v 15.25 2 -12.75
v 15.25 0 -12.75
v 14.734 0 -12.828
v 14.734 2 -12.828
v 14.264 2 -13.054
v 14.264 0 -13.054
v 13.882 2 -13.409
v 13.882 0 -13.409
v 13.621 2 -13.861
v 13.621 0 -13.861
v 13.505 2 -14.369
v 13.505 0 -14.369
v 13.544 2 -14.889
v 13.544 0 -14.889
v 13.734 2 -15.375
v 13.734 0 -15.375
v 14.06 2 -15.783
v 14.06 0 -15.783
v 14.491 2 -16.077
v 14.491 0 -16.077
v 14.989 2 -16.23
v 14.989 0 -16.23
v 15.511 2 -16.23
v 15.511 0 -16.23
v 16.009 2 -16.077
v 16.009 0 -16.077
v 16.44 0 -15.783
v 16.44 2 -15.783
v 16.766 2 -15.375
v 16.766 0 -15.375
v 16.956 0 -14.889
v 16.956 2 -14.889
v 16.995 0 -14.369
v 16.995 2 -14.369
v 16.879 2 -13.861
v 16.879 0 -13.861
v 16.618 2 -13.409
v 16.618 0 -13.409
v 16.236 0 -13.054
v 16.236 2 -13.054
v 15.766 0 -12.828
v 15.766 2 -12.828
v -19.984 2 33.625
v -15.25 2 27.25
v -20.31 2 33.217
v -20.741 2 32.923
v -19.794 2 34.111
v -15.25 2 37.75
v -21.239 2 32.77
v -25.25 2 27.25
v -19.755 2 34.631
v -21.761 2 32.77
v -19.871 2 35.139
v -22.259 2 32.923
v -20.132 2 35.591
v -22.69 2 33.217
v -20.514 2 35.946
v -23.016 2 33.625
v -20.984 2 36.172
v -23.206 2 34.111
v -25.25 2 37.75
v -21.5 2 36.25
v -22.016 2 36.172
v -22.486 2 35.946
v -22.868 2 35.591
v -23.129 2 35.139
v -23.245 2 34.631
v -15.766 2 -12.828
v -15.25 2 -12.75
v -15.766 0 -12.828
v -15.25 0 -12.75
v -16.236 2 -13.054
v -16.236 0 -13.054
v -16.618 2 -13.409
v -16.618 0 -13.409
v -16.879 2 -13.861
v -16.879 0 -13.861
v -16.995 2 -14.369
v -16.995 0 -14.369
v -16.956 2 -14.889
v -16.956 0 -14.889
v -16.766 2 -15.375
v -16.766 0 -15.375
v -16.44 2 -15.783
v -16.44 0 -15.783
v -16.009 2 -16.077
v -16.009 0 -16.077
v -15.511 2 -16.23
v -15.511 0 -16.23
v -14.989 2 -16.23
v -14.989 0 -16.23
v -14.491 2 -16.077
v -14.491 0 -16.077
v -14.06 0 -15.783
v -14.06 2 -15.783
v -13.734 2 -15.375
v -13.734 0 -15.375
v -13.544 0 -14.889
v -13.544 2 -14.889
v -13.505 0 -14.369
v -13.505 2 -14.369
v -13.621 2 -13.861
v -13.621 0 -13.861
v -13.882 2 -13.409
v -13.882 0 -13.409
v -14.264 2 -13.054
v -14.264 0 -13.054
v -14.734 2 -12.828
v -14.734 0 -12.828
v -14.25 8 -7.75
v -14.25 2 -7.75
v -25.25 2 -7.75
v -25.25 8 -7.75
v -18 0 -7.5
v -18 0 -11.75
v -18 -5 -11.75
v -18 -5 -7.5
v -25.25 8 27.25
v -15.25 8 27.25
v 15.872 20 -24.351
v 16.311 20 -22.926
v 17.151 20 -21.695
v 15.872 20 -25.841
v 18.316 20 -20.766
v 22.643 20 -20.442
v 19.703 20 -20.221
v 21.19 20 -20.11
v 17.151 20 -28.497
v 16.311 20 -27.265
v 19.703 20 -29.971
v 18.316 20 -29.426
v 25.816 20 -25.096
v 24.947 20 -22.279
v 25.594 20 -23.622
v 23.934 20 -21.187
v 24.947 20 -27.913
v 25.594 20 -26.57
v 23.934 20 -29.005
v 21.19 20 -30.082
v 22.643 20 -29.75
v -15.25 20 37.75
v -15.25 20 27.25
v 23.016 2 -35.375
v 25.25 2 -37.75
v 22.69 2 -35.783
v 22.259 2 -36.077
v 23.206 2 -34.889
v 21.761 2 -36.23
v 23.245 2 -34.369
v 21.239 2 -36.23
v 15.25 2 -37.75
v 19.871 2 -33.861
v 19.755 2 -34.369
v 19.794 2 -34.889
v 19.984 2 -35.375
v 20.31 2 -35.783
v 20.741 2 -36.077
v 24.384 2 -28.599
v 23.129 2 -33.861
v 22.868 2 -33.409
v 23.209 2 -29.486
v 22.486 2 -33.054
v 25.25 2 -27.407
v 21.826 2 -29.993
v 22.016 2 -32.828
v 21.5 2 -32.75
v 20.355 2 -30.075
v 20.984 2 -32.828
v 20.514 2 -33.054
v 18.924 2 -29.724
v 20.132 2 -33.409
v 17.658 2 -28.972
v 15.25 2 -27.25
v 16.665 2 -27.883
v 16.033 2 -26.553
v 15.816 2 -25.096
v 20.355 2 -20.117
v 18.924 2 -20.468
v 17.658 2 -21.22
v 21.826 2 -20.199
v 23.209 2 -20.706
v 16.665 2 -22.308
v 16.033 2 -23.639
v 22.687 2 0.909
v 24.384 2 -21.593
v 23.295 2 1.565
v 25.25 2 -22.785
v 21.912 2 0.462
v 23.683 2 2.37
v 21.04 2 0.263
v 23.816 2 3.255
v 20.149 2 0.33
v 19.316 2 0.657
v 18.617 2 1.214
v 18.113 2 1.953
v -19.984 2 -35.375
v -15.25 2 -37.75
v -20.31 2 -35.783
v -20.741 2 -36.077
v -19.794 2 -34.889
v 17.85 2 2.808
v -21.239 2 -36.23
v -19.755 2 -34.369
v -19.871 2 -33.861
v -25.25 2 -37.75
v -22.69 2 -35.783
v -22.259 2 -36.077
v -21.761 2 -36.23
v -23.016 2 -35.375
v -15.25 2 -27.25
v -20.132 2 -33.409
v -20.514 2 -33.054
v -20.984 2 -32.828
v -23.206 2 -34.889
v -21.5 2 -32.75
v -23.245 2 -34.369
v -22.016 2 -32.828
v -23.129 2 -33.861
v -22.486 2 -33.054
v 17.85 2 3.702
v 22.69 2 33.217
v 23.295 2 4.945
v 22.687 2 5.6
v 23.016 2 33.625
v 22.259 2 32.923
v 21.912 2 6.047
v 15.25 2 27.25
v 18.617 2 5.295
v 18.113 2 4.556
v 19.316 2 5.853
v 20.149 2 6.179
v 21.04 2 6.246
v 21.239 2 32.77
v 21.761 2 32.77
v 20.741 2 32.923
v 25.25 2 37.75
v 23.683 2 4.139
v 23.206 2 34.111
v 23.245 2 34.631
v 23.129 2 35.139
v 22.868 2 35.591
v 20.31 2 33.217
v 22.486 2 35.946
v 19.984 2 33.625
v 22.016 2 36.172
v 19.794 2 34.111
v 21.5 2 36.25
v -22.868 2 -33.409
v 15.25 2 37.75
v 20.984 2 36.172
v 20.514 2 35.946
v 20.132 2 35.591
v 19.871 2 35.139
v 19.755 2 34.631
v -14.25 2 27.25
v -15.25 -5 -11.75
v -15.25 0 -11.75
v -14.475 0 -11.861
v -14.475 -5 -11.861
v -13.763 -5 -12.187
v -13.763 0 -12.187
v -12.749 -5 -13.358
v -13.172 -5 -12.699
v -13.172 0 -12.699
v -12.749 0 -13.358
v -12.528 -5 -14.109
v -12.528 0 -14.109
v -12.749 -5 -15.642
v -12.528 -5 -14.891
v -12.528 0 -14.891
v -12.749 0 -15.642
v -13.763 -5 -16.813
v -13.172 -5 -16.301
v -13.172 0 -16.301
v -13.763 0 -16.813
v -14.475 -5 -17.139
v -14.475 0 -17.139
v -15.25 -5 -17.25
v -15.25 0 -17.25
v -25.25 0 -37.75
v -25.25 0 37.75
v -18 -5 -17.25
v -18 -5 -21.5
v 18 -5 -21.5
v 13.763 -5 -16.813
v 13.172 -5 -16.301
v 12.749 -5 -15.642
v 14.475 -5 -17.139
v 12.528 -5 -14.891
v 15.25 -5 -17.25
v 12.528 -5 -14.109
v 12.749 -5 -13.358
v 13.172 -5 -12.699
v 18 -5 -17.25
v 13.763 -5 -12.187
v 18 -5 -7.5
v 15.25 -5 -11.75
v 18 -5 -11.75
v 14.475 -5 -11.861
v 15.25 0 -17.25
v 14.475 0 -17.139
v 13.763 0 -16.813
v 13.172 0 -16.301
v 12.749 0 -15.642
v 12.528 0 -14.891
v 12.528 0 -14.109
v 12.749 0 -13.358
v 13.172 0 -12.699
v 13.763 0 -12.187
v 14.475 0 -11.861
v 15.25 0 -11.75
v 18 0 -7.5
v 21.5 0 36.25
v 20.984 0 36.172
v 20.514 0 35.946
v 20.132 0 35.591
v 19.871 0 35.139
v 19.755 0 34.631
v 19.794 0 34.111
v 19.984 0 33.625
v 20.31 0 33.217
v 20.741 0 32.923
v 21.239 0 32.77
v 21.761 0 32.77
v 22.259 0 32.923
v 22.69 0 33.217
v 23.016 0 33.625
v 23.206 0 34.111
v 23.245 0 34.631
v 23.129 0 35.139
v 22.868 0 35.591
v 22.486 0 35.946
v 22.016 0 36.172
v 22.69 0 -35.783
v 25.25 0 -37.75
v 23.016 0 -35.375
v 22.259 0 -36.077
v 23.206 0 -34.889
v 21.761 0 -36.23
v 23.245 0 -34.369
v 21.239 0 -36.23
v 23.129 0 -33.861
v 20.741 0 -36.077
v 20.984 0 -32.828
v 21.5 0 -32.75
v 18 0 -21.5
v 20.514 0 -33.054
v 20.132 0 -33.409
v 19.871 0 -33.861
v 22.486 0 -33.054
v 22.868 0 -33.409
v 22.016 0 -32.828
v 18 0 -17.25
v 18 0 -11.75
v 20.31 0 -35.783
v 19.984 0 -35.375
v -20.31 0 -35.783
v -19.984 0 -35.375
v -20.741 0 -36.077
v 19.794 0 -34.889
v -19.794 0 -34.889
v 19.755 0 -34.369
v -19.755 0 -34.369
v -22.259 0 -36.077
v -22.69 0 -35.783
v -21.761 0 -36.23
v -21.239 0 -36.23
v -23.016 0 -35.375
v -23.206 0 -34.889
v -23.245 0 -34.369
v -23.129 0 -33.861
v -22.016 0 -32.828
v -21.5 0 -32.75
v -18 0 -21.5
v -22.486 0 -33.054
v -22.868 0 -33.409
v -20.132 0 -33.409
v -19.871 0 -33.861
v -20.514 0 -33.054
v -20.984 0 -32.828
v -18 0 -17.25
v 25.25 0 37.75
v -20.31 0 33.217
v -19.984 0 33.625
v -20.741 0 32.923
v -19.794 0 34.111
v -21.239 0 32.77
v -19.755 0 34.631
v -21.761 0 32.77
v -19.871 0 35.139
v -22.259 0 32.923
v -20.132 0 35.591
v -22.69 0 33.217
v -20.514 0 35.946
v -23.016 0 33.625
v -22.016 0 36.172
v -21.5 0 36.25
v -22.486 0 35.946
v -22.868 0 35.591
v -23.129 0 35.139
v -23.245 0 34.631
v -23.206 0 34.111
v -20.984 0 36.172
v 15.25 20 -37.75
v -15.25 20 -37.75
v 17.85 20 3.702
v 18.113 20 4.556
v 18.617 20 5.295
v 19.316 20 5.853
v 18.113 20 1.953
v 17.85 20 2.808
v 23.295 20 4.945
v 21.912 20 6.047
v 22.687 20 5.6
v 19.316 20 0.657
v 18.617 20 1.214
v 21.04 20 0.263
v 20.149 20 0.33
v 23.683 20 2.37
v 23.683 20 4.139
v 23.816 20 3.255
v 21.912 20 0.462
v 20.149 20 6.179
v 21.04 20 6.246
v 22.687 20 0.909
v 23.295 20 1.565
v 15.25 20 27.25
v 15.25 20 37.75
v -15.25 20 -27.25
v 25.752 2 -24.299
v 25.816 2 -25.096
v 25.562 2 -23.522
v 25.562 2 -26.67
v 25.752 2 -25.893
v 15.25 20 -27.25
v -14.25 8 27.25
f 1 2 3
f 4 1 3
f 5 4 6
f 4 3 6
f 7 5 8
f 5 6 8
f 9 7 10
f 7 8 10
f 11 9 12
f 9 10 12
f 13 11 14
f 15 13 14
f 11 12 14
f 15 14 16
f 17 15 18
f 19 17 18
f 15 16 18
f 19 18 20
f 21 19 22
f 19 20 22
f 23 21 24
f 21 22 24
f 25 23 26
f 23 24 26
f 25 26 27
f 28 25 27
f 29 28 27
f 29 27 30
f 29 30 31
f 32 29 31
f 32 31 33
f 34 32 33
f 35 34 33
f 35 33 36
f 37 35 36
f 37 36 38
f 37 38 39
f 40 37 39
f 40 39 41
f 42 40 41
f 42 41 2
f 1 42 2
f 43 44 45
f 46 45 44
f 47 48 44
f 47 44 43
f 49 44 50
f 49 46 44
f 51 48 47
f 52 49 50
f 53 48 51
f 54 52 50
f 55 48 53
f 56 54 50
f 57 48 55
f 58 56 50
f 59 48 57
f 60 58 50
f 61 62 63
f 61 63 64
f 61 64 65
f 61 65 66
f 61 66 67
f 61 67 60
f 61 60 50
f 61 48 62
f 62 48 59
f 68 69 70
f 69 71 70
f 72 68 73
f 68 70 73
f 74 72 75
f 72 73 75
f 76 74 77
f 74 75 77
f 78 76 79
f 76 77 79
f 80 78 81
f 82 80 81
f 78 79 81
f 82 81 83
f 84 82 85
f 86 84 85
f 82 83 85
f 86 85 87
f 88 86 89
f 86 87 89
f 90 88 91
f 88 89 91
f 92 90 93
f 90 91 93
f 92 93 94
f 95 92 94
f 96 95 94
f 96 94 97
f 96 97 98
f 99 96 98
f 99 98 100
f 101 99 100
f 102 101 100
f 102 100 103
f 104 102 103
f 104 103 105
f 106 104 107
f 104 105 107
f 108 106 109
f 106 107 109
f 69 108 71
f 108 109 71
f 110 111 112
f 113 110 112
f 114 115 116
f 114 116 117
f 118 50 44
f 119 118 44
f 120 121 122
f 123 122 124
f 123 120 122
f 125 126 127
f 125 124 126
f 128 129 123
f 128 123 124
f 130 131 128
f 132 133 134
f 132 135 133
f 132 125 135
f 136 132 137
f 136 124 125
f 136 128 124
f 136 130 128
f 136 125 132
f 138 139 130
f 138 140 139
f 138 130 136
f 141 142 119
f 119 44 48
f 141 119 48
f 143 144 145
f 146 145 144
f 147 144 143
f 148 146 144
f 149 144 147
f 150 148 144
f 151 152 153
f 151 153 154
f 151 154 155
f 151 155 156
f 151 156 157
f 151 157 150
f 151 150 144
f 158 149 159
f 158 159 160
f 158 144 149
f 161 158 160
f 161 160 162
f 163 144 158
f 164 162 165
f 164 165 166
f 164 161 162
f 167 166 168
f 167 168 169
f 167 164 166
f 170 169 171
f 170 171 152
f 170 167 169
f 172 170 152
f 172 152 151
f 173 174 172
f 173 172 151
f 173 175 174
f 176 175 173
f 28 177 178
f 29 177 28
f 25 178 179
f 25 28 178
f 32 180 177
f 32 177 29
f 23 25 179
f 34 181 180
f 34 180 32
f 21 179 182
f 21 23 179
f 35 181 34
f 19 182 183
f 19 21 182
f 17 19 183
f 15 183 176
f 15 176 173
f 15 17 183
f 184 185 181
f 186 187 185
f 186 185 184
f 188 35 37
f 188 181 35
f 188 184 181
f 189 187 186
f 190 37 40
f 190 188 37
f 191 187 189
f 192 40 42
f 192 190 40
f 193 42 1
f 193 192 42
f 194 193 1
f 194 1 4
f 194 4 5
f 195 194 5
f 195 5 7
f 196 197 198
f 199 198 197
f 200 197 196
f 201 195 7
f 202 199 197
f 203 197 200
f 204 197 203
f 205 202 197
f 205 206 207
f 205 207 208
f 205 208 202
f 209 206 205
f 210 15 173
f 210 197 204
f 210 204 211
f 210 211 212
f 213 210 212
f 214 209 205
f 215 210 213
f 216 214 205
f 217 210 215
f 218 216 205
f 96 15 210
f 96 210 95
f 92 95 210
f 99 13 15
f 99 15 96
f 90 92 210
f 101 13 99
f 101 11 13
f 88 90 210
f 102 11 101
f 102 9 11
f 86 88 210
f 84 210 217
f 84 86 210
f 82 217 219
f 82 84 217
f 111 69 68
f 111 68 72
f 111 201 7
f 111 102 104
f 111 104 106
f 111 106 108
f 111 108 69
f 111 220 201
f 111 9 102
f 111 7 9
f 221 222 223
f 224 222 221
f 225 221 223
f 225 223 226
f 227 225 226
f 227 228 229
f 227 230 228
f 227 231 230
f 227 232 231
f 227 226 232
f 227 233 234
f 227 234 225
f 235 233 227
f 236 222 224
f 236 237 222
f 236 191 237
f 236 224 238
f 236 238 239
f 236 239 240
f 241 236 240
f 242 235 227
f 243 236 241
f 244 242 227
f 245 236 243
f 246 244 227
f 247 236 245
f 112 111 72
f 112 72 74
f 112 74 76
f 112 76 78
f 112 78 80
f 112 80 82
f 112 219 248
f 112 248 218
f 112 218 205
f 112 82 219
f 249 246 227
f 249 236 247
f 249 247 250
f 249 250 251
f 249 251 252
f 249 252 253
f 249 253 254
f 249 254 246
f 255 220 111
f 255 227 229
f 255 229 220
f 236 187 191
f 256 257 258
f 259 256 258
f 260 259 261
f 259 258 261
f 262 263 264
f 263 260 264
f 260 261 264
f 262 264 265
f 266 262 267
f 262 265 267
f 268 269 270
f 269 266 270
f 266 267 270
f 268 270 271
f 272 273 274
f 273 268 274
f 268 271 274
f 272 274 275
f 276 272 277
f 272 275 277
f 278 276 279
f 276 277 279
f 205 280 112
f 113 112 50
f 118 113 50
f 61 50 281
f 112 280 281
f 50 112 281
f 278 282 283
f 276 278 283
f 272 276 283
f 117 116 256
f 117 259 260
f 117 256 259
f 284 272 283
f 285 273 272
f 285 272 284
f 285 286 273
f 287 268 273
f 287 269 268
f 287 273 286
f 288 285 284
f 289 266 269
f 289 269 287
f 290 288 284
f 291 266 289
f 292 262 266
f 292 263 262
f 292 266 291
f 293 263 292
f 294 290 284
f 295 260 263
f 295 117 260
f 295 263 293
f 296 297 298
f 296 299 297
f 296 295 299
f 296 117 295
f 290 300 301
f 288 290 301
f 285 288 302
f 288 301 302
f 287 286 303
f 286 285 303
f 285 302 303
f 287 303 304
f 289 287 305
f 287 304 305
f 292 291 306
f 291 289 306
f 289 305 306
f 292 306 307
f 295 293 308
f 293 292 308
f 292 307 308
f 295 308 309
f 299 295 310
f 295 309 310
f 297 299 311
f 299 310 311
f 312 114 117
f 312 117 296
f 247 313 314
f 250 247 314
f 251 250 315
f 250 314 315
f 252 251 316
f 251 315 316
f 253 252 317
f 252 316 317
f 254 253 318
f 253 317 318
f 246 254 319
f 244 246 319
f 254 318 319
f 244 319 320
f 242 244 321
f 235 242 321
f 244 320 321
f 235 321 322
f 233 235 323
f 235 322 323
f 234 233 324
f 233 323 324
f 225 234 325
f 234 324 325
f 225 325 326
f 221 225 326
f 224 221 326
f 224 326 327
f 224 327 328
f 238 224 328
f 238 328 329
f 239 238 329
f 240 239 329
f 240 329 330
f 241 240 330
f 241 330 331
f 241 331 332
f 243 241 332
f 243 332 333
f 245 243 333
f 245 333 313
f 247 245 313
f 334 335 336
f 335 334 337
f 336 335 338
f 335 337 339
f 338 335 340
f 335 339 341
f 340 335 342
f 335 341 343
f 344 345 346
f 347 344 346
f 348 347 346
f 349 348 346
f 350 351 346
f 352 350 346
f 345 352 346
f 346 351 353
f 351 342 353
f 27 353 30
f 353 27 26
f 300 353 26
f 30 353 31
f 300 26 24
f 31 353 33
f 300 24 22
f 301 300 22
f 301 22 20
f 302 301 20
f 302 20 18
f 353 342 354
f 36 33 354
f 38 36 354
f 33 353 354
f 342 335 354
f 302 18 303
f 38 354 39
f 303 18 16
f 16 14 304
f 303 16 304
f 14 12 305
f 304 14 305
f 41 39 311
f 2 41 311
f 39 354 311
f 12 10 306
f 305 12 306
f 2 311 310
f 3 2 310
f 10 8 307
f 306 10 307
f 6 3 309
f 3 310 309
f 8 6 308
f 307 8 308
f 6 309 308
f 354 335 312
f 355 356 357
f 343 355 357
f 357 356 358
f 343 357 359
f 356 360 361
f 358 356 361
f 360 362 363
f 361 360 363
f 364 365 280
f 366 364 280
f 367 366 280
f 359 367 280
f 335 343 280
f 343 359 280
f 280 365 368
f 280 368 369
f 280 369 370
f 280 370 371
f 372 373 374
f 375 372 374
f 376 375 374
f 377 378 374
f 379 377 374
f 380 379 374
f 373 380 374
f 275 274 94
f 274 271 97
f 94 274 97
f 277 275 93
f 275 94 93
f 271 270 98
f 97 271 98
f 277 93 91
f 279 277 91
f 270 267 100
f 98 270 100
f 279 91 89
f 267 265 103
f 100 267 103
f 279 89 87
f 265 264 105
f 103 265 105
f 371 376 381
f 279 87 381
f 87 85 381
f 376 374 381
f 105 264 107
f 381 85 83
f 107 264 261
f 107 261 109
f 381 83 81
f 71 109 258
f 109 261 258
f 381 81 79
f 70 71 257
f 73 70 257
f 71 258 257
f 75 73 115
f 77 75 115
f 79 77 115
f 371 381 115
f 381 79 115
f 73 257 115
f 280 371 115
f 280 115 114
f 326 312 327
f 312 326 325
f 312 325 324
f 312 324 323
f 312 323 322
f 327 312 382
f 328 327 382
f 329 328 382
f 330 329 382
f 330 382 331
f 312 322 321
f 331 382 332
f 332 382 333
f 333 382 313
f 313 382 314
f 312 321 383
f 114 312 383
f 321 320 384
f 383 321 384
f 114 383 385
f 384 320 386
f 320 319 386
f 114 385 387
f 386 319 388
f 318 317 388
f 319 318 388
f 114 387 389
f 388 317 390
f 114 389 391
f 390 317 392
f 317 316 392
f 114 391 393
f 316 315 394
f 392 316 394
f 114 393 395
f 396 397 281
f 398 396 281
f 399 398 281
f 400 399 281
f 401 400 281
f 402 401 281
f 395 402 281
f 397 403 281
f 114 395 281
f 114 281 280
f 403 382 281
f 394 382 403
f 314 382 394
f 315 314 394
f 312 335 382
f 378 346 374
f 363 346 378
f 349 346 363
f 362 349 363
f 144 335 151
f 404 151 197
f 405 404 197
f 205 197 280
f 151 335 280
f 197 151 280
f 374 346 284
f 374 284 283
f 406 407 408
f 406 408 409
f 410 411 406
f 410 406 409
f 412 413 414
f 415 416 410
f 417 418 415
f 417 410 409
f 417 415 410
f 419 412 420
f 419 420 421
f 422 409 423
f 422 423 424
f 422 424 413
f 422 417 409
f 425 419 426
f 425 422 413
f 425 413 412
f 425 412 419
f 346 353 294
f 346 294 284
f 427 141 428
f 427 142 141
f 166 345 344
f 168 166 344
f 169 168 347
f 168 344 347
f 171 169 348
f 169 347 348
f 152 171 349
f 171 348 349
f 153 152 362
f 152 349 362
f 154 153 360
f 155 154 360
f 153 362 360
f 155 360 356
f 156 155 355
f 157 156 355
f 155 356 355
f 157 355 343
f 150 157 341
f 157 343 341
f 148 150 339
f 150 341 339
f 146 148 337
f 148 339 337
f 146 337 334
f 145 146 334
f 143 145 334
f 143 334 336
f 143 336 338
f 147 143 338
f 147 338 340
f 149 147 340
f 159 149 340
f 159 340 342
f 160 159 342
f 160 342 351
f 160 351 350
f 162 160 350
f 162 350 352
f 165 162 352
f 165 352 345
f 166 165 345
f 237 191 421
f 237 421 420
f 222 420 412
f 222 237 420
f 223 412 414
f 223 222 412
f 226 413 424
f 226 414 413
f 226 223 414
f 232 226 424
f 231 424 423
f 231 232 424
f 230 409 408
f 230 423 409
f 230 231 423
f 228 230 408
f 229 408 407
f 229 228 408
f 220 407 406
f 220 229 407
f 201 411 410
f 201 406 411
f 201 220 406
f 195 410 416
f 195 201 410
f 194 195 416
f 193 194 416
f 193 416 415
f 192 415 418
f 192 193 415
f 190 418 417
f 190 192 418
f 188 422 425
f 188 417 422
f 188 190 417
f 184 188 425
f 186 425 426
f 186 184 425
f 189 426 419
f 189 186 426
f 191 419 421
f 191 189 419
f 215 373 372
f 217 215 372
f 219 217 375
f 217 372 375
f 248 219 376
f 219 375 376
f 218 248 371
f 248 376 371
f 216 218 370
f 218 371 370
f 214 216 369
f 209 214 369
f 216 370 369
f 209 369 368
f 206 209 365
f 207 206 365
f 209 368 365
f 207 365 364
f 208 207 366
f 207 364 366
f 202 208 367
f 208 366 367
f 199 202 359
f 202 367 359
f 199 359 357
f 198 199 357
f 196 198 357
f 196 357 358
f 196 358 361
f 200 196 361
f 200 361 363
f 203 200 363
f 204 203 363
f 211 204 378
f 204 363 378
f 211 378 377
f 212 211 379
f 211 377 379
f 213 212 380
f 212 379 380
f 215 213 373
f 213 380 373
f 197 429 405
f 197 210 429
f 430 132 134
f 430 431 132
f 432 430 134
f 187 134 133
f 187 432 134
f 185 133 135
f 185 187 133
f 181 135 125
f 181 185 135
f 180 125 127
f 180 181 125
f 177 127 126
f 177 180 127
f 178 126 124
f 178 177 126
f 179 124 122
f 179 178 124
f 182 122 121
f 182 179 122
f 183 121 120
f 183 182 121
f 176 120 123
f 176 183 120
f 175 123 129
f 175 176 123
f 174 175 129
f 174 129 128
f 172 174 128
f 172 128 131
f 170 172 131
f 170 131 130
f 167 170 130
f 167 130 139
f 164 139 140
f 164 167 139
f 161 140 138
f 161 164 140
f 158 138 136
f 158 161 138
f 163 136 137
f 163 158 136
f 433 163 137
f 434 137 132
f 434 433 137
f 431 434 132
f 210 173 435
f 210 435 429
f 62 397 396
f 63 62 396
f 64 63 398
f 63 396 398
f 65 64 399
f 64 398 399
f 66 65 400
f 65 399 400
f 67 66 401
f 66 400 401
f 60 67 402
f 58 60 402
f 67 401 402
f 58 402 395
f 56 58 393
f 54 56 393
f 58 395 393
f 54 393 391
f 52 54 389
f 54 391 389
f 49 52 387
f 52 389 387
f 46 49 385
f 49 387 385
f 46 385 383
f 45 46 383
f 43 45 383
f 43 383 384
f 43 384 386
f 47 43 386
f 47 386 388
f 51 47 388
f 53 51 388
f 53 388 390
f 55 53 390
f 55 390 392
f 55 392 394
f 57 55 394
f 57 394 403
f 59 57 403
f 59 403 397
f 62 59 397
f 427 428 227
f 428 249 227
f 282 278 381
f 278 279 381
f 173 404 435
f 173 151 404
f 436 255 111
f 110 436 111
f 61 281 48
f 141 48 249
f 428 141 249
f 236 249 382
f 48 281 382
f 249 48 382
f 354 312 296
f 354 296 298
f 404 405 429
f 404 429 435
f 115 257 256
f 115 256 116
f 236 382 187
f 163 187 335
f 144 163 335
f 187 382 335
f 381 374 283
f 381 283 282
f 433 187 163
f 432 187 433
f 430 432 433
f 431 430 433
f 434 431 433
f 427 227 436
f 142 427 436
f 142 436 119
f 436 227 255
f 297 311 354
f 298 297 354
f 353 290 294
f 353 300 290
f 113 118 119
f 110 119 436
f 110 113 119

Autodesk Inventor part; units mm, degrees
ref_plane "YZ Plane" through (0, 0, 0) normal (1, 0, 0) x (0, 1, 0)
ref_plane "XZ Plane" through (0, 0, 0) normal (0, 1, 0) x (-1, 0, 0)
ref_plane "XY Plane" through (0, 0, 0) normal (0, 0, 1) x (1, 0, 0)
sketch "Szkic1" plane through (0, 0, 0) normal (0, 1, 0) x (-1, 0, 0)
  line L0 (-25.25, -37.75) -> (25.25, -37.75)
  line L1 (25.25, -37.75) -> (25.25, 37.75)
  line L2 (25.25, 37.75) -> (-25.25, 37.75)
  line L3 (-25.25, 37.75) -> (-25.25, -37.75)
  line L4 (-25.25, -37.75) -> (25.25, 37.75) construction
  line L5 (25.25, -37.75) -> (-25.25, 37.75) construction
  point P0 (0, 0)
  dimension "d0" = 50.5
  dimension "d1" = 75.5
extrude "Wyciągnięcie proste1" add sketch "Szkic1" along normal blind 2
sketch "Szkic2" plane through (0, 2, 0) normal (0, 1, 0) x (1, 0, 0)
  line L0 (25.25, 37.75) -> (-25.25, 37.75) projected
  line L1 (-25.25, 37.75) -> (-25.25, -37.75) projected
  line L2 (-25.25, -37.75) -> (25.25, -37.75) projected
  line L3 (25.25, -37.75) -> (25.25, 37.75) projected
  line L4 (-25.25, 37.75) -> (-25.25, -37.75) projected
  point P0 (0, 0)
  point P1 (-21.5, -34.5)
  point P2 (-21.5, 34.5)
  point P3 (21.5, 34.5)
  point P4 (21.5, -34.5)
  point P5 (-15.25, 14.5)
  point P6 (15.25, 14.5)
  dimension "d4" = 69
  dimension "d5" = 69
  dimension "d6" = 43
  dimension "d7" = 43
  dimension "d8" = 75.5
  dimension "d9" = 50.5
  dimension "d10" = 3.75
  dimension "d11" = 3.25
  dimension "d13" = 3.75
  dimension "d14" = 3.25
  dimension "d15" = 20
  dimension "d16" = 20
  dimension "d17" = 30.5
  dimension "d19" = 10
  dimension "d20" = 10
hole "Otwór1" at (-21.5, 2, 34.5) at (-21.5, 2, -34.5) at (21.5, 2, -34.5) at (21.5, 2, 34.5) at (-15.25, 2, -14.5) at (15.25, 2, -14.5) direction (0, -1, 0) diameter 3.5 end through all
sketch "Szkic3" plane through (0, 2, 0) normal (0, 1, 0) x (1, 0, 0)
  circle A0 centre (-15.25, 14.5) radius 1.75 projected
  circle A1 centre (21.5, 34.5) radius 1.75 projected
  circle A2 centre (-21.5, -34.5) radius 1.75 projected
  circle A3 centre (-21.5, 34.5) radius 1.75 projected
  circle A4 centre (21.5, -34.5) radius 1.75 projected
  circle A5 centre (15.25, 14.5) radius 1.75 projected
  line L0 (25.25, 37.75) -> (-25.25, 37.75) projected
  line L1 (-25.25, 37.75) -> (-25.25, -37.75) projected
  line L2 (-25.25, -37.75) -> (25.25, -37.75) projected
  line L3 (25.25, -37.75) -> (25.25, 37.75) projected
  line L4 (-15.25, 37.75) -> (15.25, 37.75)
  line L5 (15.25, 37.75) -> (15.25, 27.25)
  line L6 (15.25, 27.25) -> (-15.25, 27.25)
  line L7 (-15.25, 27.25) -> (-15.25, 37.75)
  circle A6 centre (20.8161, 25.0959) radius 5
  line L8 (-15.25, -37.75) -> (15.25, -37.75)
  line L9 (15.25, -37.75) -> (15.25, -27.25)
  line L10 (15.25, -27.25) -> (-15.25, -27.25)
  line L11 (-15.25, -27.25) -> (-15.25, -37.75)
  line L12 (-25.25, -27.25) -> (-15.25, -27.25)
  line L13 (-15.25, -27.25) -> (-15.25, 7.75)
  line L14 (-15.25, 7.75) -> (-25.25, 7.75)
  line L15 (-25.25, 7.75) -> (-25.25, -27.25)
  circle A7 centre (20.8161, -3.2547) radius 3
  point P0 (0, 0)
  dimension "d28" = 10.5
  dimension "d29" = 10
  dimension "d30" = 10
  dimension "d31" = 10
  dimension "d32" = 10.5
  dimension "d33" = 10
  dimension "d34" = 10
  dimension "d35" = 35
  dimension "d36" = 6
extrude "Wyciągnięcie proste2" add sketch "Szkic3" along normal blind 18 contours L5 L6 L7 L0 | A6 L3 | L3 A6 | L2 L11 L10 L9 | A7
sketch "Szkic4" plane through (0, 2, 0) normal (0, 1, 0) x (1, 0, 0)
  line L0 (15.25, -27.25) -> (15.25, -37.75) projected
  line L1 (15.25, -37.75) -> (25.25, -37.75) projected
  line L2 (25.25, -37.75) -> (25.25, 22.7849) projected
  arc A0 (25.25, 27.4069) -> (25.25, 22.7849) centre (20.8161, 25.0959) ccw projected
  line L3 (25.25, 27.4069) -> (25.25, 37.75) projected
  line L4 (25.25, 37.75) -> (15.25, 37.75) projected
  line L5 (15.25, 37.75) -> (15.25, 27.25) projected
  line L6 (15.25, 27.25) -> (-15.25, 27.25) projected
  line L7 (-15.25, 27.25) -> (-15.25, 37.75) projected
  line L8 (-15.25, 37.75) -> (-25.25, 37.75) projected
  line L9 (-25.25, 37.75) -> (-25.25, -37.75) projected
  line L10 (-25.25, -37.75) -> (-15.25, -37.75) projected
  line L11 (-15.25, -37.75) -> (-15.25, -27.25) projected
  line L12 (-15.25, -27.25) -> (15.25, -27.25) projected
  circle A1 centre (20.8161, -3.2547) radius 3 projected
  circle A2 centre (-15.25, 14.5) radius 1.75 projected
  circle A3 centre (21.5, 34.5) radius 1.75 projected
  circle A4 centre (-21.5, -34.5) radius 1.75 projected
  circle A5 centre (-21.5, 34.5) radius 1.75 projected
  circle A6 centre (21.5, -34.5) radius 1.75 projected
  circle A7 centre (15.25, 14.5) radius 1.75 projected
  line L13 (-25.25, 37.75) -> (-25.25, -37.75) projected
  line L14 (-25.25, -27.25) -> (-14.25, -27.25)
  line L15 (-14.25, -27.25) -> (-14.25, 7.75)
  line L16 (-14.25, 7.75) -> (-25.25, 7.75)
  line L17 (-25.25, 7.75) -> (-25.25, -27.25)
  point P0 (0, 0)
  dimension "d39" = 11
  dimension "d40" = 35
extrude "Wyciągnięcie proste3" add sketch "Szkic4" along normal blind 6 contours L12 L14 L9 L16 L15
sketch "Szkic5" plane through (0, 0, 0) normal (0, -1, 0) x (1, 0, 0)
  circle A0 centre (-15.25, -14.5) radius 1.75 projected
  circle A1 centre (21.5, -34.5) radius 1.75 projected
  circle A2 centre (-21.5, 34.5) radius 1.75 projected
  circle A3 centre (-21.5, -34.5) radius 1.75 projected
  circle A4 centre (21.5, 34.5) radius 1.75 projected
  circle A5 centre (15.25, -14.5) radius 1.75 projected
  line L0 (25.25, -37.75) -> (-25.25, -37.75) projected
  line L1 (25.25, 37.75) -> (25.25, -37.75) projected
  line L2 (-25.25, 37.75) -> (25.25, 37.75) projected
  line L3 (-25.25, -37.75) -> (-25.25, 37.75) projected
  line L4 (-18, -7.5) -> (18, -7.5)
  line L5 (18, -21.5) -> (-18, -21.5)
  arc A6 (-15.25, -17.25) -> (-15.25, -11.75) centre (-15.25, -14.5) ccw
  arc A7 (15.25, -11.75) -> (15.25, -17.25) centre (15.25, -14.5) ccw
  line L6 (-15.25, -11.75) -> (-18, -11.75)
  line L7 (-15.25, -17.25) -> (-18, -17.25)
  line L8 (15.25, -11.75) -> (18, -11.75)
  line L9 (15.25, -17.25) -> (18, -17.25)
  line L10 (-18, -21.5) -> (-18, -17.25)
  line L11 (-18, -11.75) -> (-18, -7.5)
  line L12 (18, -7.5) -> (18, -11.75)
  line L13 (18, -17.25) -> (18, -21.5)
  point P0 (0, 0)
  dimension "d43" = 36
  dimension "d44" = 14
  dimension "d45" = 7
  dimension "d46" = 7
extrude "Wyciągnięcie proste4" add sketch "Szkic5" along normal blind 5 contours L4 L12 L8 A7 L9 L13 L5 L10 L7 A6 L6 L11
equation "\"d5\" = d4"
equation "\"d7\" = d6"
equation "\"d10\" = -0.5 * d6 + 0.5 * d9"
equation "\"d11\" = -0.5 * d4 + 0.5 * d8"
equation "\"d13\" = d10"
equation "\"d14\" = d11"
equation "\"d16\" = d15"
equation "\"d19\" = d20"
equation "\"d30\" = d29"
equation "\"d34\" = d33"
equation "\"d45\" = d46"
equation "\"d47\" = d48"
equation "\"d48\" = 2.75"
properties part number "step driver"
